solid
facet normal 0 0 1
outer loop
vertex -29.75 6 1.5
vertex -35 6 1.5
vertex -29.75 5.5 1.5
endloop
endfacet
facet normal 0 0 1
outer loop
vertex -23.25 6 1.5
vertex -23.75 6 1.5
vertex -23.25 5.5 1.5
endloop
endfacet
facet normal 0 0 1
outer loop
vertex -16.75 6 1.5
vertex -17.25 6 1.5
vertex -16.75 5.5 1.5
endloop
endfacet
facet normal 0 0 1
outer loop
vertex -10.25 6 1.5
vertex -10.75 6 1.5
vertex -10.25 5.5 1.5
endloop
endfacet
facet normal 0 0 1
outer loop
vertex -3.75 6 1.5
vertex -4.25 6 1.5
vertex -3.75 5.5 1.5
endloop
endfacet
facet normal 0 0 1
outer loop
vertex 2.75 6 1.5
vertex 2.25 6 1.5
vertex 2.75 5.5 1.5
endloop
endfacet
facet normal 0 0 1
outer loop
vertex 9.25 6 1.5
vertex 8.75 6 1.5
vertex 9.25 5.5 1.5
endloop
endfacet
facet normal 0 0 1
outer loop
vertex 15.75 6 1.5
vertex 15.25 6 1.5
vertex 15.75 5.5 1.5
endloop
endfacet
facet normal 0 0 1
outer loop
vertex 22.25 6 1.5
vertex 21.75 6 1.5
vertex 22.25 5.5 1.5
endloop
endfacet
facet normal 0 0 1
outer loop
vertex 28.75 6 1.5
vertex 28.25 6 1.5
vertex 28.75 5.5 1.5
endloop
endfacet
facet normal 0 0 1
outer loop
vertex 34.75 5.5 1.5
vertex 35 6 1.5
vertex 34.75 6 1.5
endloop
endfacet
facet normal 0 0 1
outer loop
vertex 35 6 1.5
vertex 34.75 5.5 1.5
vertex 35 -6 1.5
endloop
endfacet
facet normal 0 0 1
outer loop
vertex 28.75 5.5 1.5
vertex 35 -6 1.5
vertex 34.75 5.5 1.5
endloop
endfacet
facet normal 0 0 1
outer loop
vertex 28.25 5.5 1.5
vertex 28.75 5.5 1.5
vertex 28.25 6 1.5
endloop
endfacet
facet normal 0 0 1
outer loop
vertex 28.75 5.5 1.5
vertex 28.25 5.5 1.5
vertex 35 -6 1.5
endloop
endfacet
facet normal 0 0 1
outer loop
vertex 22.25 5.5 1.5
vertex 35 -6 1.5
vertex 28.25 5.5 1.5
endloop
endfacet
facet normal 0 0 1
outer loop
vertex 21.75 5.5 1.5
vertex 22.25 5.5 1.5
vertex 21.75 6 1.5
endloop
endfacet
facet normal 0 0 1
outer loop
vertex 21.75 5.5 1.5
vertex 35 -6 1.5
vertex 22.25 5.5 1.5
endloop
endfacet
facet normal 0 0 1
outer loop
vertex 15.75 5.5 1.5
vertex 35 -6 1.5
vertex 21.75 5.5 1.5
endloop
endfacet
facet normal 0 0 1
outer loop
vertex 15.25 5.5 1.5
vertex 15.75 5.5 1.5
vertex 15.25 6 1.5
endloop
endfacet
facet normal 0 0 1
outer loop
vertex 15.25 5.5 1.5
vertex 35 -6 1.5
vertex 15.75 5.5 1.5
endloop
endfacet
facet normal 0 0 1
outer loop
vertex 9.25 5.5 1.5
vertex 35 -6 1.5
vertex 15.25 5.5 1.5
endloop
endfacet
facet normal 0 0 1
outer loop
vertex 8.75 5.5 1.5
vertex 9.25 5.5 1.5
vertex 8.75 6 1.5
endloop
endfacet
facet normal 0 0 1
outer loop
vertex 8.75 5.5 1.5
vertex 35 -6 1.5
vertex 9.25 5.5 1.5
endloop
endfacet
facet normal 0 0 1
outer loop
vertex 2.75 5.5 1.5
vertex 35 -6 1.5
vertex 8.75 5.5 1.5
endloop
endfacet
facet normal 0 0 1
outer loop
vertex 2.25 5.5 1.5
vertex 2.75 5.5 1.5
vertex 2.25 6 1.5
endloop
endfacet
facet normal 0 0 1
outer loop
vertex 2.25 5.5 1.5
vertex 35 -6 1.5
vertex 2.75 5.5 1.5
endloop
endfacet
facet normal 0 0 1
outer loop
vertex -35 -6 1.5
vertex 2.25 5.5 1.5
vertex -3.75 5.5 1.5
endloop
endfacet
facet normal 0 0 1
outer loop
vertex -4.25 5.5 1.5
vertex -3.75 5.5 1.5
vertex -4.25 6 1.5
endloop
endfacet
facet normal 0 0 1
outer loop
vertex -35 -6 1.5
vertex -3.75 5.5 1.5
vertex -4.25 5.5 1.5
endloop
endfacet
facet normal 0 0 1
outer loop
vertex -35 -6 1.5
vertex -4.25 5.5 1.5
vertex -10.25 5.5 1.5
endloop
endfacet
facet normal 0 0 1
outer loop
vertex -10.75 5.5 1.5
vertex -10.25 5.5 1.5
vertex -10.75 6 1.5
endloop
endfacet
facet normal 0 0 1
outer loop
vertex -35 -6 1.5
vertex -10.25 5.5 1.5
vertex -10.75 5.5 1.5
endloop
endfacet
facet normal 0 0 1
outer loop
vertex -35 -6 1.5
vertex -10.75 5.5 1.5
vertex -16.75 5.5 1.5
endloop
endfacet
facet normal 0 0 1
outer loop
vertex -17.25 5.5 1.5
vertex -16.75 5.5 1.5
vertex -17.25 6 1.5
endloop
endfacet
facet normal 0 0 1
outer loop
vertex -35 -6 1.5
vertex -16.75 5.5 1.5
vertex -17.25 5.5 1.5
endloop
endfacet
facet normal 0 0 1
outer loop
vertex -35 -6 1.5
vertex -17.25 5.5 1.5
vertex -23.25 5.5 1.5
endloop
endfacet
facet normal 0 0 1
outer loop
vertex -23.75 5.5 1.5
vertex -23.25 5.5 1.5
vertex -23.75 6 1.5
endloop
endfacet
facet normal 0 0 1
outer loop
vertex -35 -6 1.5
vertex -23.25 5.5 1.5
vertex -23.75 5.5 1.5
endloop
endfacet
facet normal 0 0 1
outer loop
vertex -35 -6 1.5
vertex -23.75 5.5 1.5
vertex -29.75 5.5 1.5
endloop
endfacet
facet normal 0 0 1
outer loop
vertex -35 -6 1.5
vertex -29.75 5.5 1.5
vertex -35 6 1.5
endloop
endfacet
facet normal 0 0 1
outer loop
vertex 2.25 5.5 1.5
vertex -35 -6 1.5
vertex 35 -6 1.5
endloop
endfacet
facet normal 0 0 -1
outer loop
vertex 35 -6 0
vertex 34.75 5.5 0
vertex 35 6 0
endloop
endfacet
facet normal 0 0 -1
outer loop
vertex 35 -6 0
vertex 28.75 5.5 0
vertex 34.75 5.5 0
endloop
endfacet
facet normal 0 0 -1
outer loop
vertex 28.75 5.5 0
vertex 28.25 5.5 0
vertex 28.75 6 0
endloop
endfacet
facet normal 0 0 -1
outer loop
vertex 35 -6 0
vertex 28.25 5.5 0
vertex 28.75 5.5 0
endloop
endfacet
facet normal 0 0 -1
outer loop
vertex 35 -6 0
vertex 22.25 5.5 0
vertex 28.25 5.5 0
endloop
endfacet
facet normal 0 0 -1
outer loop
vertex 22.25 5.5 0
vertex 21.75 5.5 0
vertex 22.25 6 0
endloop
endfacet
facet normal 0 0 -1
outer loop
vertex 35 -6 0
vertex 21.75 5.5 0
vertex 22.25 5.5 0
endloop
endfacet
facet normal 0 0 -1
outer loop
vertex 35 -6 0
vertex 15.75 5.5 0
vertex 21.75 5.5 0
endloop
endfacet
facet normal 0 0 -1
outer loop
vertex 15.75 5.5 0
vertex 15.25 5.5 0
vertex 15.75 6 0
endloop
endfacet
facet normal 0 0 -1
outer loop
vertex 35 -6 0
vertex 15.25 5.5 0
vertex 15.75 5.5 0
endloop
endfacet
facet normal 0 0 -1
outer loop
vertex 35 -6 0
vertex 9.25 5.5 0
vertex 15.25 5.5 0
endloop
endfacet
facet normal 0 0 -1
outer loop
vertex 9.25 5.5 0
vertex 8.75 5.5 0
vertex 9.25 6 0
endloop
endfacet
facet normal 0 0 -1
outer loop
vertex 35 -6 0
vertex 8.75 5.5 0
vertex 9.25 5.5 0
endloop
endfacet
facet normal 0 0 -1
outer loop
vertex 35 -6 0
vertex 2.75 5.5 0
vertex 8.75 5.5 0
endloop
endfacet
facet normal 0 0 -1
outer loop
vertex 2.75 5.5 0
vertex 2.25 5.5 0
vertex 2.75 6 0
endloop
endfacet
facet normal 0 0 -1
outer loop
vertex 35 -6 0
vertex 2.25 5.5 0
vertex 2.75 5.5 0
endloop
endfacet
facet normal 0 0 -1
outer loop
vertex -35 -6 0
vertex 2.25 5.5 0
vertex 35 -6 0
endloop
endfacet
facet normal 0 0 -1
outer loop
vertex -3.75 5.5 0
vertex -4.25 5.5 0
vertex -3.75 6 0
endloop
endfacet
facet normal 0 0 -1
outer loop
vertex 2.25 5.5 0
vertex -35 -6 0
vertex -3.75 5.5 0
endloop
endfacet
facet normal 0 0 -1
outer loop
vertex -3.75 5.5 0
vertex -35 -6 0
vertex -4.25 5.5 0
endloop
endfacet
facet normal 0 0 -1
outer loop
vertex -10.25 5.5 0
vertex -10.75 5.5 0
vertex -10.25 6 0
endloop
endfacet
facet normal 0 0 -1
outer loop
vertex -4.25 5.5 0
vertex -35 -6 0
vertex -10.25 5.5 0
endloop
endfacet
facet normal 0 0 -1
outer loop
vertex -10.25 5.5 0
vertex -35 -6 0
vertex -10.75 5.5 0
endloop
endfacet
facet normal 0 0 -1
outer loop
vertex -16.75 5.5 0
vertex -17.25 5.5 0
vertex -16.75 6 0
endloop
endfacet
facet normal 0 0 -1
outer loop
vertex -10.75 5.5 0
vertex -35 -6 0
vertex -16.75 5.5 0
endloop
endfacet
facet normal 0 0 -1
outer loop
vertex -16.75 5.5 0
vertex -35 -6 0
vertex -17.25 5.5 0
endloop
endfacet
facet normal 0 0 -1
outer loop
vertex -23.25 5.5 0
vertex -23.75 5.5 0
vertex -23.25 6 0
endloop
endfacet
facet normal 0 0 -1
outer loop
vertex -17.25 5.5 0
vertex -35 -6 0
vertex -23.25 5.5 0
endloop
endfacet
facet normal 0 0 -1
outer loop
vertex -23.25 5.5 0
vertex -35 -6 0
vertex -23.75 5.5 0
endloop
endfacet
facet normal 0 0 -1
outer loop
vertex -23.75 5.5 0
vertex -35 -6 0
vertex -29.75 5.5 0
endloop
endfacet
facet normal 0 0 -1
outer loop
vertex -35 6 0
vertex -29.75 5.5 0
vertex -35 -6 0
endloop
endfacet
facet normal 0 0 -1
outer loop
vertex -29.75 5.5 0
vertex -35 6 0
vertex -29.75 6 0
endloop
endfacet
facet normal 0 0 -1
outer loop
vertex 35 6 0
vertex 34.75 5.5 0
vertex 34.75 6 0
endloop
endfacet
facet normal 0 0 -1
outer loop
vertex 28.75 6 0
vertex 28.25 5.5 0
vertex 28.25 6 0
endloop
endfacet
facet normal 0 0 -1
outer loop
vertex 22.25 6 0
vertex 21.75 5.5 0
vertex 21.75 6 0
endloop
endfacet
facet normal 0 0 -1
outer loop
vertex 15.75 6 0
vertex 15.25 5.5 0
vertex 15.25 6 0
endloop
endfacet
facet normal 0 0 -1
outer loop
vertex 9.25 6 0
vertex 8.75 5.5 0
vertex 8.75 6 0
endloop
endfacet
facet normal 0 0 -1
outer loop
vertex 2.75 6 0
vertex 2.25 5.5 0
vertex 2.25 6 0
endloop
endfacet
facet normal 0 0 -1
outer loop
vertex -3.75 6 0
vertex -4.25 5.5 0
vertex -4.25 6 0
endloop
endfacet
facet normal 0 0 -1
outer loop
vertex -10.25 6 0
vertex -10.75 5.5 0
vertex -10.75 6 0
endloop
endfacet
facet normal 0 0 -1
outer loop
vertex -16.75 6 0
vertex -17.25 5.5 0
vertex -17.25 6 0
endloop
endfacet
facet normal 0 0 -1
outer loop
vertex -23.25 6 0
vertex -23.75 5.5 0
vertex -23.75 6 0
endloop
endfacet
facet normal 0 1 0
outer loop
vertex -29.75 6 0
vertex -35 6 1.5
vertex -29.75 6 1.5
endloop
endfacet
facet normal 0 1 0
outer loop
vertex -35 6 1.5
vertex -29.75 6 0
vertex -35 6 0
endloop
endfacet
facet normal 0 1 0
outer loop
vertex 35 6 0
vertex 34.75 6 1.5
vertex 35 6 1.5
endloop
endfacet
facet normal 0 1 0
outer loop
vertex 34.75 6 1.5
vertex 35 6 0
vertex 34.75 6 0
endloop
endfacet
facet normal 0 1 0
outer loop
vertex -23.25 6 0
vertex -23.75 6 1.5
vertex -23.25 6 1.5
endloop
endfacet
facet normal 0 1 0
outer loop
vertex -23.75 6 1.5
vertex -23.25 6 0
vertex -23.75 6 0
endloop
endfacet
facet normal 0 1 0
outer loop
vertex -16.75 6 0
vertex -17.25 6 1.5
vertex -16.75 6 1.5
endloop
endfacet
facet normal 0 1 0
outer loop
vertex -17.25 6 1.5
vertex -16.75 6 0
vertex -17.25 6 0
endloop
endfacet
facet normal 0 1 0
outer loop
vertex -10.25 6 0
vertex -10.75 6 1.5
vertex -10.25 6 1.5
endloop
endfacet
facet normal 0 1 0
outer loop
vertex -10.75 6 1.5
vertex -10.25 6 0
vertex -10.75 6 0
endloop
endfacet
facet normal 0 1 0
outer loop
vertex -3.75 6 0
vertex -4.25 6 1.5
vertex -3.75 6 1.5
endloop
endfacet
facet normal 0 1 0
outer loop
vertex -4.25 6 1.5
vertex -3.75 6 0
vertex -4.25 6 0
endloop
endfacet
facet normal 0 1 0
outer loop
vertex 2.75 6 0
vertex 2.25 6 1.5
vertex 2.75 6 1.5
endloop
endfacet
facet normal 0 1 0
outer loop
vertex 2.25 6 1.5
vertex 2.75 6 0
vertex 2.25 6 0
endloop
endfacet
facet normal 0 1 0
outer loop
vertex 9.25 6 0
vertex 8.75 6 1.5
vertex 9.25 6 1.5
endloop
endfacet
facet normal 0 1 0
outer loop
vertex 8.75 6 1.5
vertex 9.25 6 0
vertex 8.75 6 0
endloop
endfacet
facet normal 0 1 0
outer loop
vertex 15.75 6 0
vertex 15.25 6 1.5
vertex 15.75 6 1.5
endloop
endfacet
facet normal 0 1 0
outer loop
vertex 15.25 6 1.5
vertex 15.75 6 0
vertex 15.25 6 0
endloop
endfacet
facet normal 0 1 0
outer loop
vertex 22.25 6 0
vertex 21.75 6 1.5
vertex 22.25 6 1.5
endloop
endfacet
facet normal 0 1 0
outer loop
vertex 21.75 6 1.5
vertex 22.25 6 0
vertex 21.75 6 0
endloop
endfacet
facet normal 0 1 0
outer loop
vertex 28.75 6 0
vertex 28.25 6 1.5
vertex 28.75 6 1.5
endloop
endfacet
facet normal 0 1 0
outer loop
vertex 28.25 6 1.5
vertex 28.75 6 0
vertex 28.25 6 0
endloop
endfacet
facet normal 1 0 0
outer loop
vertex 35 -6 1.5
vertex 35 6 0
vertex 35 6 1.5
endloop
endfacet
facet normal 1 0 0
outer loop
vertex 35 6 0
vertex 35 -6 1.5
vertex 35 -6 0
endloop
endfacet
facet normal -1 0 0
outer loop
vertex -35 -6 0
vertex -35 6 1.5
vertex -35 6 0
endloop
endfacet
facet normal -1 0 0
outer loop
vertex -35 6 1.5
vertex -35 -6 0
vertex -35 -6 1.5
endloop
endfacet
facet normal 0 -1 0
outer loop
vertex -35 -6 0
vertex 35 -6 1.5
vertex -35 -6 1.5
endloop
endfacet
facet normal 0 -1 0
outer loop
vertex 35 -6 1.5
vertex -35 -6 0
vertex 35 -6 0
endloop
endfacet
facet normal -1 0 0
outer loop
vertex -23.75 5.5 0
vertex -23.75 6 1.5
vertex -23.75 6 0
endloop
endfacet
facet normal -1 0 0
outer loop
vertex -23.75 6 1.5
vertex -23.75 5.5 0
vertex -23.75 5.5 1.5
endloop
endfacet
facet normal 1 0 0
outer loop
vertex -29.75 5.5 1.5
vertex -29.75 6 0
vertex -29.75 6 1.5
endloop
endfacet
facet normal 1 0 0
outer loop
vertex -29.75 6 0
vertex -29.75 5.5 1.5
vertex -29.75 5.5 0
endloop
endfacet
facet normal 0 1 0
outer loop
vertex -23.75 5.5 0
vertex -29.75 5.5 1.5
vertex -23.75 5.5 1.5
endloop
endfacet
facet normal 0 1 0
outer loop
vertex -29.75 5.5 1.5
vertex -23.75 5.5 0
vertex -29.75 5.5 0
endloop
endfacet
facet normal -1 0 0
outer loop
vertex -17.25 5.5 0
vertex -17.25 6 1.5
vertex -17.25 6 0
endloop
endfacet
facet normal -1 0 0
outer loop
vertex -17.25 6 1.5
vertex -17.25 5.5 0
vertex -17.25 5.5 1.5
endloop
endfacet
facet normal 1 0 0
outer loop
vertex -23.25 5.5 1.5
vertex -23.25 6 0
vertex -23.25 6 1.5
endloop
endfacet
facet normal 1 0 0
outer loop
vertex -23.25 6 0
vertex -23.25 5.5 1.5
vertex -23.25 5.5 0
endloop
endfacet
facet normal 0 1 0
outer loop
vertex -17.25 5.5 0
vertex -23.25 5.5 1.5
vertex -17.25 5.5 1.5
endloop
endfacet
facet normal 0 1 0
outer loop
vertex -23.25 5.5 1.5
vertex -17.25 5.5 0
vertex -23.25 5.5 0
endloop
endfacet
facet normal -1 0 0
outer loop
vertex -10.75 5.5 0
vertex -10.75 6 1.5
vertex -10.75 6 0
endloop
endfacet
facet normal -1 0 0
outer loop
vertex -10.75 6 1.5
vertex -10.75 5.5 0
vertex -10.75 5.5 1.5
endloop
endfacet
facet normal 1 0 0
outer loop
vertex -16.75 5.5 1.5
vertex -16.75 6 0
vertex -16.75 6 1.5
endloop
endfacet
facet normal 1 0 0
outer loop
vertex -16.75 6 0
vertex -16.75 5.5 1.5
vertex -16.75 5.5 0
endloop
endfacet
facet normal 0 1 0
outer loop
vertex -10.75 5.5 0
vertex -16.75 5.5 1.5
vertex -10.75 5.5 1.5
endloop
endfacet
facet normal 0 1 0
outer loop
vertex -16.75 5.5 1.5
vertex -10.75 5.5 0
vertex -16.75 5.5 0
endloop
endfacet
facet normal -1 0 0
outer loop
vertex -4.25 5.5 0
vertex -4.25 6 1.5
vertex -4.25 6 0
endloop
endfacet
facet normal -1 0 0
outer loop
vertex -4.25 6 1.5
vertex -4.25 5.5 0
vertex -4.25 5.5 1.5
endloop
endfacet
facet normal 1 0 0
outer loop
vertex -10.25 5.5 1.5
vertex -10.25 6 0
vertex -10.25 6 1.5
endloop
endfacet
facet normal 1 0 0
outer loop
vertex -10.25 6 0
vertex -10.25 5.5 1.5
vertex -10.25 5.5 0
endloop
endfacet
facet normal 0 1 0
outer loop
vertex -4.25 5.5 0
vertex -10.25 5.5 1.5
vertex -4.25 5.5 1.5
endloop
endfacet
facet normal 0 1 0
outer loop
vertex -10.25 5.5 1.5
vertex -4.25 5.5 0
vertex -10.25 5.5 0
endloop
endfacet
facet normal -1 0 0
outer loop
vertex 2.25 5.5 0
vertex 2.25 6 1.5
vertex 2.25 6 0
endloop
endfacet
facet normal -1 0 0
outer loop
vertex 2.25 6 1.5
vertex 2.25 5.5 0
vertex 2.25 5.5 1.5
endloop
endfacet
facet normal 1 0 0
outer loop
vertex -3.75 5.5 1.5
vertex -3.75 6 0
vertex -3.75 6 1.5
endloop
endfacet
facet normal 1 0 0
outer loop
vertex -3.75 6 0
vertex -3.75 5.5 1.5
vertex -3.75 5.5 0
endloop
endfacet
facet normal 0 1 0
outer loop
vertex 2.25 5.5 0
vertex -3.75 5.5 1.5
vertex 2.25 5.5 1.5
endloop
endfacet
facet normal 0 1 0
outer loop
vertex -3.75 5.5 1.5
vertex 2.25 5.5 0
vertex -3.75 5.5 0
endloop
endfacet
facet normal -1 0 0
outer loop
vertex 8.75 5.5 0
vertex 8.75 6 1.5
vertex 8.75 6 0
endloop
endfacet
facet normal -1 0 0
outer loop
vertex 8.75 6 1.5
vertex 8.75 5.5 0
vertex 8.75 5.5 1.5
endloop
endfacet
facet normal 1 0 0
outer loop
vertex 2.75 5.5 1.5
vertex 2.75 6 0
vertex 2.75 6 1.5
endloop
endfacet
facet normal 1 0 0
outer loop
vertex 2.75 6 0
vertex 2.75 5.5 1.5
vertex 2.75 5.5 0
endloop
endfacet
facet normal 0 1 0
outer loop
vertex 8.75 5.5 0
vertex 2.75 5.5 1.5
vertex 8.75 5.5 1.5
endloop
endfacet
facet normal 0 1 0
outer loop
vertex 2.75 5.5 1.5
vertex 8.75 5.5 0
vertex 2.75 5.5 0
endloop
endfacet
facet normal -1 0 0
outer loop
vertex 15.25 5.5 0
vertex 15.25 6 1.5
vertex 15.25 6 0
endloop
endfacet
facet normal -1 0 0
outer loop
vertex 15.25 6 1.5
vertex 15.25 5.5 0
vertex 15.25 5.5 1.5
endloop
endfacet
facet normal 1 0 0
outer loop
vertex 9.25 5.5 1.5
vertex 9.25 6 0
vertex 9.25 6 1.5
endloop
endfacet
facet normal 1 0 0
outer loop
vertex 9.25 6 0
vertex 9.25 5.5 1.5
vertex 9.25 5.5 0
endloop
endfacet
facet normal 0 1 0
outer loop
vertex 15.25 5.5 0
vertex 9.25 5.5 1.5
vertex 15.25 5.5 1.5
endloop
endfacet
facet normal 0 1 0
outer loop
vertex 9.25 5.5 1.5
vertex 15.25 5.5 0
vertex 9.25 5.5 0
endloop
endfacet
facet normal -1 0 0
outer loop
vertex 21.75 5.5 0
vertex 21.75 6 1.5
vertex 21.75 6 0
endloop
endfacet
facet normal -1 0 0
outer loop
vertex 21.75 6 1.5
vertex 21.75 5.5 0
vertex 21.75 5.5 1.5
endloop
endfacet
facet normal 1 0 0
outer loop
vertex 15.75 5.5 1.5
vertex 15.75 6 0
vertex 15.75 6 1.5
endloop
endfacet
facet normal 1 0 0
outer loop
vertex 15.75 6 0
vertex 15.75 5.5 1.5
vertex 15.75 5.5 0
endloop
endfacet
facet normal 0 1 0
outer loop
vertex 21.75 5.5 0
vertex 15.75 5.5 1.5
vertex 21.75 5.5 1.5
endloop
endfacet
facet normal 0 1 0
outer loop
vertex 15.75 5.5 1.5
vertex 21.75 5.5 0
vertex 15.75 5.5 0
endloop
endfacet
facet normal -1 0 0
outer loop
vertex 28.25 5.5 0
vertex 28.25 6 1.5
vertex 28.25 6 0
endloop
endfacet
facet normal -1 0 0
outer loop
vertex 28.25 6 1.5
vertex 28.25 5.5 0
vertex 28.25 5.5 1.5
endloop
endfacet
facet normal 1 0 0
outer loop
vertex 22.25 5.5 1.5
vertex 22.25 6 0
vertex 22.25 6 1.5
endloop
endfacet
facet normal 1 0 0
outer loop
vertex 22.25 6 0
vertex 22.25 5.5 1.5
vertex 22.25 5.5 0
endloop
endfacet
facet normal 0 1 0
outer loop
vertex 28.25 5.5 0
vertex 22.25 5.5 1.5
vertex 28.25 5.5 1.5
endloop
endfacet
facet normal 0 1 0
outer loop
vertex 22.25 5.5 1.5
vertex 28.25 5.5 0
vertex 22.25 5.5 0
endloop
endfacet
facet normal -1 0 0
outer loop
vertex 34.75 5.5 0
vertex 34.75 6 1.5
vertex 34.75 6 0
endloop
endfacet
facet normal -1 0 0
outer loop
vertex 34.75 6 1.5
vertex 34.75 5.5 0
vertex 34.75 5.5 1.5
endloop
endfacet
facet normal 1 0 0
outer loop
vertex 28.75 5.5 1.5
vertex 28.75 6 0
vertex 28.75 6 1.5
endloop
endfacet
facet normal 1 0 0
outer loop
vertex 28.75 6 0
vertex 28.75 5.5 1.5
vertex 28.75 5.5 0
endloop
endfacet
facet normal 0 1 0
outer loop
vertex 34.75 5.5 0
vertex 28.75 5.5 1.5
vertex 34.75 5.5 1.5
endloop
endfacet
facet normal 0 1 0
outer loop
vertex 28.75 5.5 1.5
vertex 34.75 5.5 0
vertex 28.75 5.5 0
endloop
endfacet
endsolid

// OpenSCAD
// 10-well agarose gel casting comb
// Print orientation: flat on bed, teeth pointing down (-Y)

// ---------- Parameters ----------
plate_t      = 1.5;   // plate thickness (Z)
spine_len    = 70;    // spine length (X)
spine_w      = 12;    // spine width (Y)
tooth_w      = 5.0;   // tooth width (X)
tooth_len    = 12;    // tooth length (Y)
tooth_count  = 10;    // number of teeth
gap          = 1.5;   // gap between teeth (X)
eps          = 0.5;   // cutter overshoot past faces

$fn = 64;

// ---------- Derived ----------
pitch   = tooth_w + gap;          // centre-to-centre spacing of teeth
x_start = -(tooth_count - 1) * pitch / 2;  // first tooth centre (row centred)

// ---------- Model ----------
difference() {
    // Plate: spine + teeth, built upward from z = 0
    union() {
        // Spine (back bar)
        translate([-spine_len / 2, -spine_w / 2, 0])
            cube([spine_len, spine_w, plate_t]);

        // Teeth hanging in -Y from the spine's long edge
        for (i = [0 : tooth_count - 1])
            translate([x_start + i * pitch,
                       spine_w / 2,
                       0])
                cube([tooth_w, tooth_len, plate_t]);
    }

    // Cut out the wells (through the full thickness)
    for (i = [0 : tooth_count - 1])
        translate([x_start + i * pitch - eps,
                   spine_w / 2 - eps,
                   -eps])
            cube([tooth_w + 2 * eps,
                  tooth_len + 2 * eps,
                  plate_t + 2 * eps]);
}
